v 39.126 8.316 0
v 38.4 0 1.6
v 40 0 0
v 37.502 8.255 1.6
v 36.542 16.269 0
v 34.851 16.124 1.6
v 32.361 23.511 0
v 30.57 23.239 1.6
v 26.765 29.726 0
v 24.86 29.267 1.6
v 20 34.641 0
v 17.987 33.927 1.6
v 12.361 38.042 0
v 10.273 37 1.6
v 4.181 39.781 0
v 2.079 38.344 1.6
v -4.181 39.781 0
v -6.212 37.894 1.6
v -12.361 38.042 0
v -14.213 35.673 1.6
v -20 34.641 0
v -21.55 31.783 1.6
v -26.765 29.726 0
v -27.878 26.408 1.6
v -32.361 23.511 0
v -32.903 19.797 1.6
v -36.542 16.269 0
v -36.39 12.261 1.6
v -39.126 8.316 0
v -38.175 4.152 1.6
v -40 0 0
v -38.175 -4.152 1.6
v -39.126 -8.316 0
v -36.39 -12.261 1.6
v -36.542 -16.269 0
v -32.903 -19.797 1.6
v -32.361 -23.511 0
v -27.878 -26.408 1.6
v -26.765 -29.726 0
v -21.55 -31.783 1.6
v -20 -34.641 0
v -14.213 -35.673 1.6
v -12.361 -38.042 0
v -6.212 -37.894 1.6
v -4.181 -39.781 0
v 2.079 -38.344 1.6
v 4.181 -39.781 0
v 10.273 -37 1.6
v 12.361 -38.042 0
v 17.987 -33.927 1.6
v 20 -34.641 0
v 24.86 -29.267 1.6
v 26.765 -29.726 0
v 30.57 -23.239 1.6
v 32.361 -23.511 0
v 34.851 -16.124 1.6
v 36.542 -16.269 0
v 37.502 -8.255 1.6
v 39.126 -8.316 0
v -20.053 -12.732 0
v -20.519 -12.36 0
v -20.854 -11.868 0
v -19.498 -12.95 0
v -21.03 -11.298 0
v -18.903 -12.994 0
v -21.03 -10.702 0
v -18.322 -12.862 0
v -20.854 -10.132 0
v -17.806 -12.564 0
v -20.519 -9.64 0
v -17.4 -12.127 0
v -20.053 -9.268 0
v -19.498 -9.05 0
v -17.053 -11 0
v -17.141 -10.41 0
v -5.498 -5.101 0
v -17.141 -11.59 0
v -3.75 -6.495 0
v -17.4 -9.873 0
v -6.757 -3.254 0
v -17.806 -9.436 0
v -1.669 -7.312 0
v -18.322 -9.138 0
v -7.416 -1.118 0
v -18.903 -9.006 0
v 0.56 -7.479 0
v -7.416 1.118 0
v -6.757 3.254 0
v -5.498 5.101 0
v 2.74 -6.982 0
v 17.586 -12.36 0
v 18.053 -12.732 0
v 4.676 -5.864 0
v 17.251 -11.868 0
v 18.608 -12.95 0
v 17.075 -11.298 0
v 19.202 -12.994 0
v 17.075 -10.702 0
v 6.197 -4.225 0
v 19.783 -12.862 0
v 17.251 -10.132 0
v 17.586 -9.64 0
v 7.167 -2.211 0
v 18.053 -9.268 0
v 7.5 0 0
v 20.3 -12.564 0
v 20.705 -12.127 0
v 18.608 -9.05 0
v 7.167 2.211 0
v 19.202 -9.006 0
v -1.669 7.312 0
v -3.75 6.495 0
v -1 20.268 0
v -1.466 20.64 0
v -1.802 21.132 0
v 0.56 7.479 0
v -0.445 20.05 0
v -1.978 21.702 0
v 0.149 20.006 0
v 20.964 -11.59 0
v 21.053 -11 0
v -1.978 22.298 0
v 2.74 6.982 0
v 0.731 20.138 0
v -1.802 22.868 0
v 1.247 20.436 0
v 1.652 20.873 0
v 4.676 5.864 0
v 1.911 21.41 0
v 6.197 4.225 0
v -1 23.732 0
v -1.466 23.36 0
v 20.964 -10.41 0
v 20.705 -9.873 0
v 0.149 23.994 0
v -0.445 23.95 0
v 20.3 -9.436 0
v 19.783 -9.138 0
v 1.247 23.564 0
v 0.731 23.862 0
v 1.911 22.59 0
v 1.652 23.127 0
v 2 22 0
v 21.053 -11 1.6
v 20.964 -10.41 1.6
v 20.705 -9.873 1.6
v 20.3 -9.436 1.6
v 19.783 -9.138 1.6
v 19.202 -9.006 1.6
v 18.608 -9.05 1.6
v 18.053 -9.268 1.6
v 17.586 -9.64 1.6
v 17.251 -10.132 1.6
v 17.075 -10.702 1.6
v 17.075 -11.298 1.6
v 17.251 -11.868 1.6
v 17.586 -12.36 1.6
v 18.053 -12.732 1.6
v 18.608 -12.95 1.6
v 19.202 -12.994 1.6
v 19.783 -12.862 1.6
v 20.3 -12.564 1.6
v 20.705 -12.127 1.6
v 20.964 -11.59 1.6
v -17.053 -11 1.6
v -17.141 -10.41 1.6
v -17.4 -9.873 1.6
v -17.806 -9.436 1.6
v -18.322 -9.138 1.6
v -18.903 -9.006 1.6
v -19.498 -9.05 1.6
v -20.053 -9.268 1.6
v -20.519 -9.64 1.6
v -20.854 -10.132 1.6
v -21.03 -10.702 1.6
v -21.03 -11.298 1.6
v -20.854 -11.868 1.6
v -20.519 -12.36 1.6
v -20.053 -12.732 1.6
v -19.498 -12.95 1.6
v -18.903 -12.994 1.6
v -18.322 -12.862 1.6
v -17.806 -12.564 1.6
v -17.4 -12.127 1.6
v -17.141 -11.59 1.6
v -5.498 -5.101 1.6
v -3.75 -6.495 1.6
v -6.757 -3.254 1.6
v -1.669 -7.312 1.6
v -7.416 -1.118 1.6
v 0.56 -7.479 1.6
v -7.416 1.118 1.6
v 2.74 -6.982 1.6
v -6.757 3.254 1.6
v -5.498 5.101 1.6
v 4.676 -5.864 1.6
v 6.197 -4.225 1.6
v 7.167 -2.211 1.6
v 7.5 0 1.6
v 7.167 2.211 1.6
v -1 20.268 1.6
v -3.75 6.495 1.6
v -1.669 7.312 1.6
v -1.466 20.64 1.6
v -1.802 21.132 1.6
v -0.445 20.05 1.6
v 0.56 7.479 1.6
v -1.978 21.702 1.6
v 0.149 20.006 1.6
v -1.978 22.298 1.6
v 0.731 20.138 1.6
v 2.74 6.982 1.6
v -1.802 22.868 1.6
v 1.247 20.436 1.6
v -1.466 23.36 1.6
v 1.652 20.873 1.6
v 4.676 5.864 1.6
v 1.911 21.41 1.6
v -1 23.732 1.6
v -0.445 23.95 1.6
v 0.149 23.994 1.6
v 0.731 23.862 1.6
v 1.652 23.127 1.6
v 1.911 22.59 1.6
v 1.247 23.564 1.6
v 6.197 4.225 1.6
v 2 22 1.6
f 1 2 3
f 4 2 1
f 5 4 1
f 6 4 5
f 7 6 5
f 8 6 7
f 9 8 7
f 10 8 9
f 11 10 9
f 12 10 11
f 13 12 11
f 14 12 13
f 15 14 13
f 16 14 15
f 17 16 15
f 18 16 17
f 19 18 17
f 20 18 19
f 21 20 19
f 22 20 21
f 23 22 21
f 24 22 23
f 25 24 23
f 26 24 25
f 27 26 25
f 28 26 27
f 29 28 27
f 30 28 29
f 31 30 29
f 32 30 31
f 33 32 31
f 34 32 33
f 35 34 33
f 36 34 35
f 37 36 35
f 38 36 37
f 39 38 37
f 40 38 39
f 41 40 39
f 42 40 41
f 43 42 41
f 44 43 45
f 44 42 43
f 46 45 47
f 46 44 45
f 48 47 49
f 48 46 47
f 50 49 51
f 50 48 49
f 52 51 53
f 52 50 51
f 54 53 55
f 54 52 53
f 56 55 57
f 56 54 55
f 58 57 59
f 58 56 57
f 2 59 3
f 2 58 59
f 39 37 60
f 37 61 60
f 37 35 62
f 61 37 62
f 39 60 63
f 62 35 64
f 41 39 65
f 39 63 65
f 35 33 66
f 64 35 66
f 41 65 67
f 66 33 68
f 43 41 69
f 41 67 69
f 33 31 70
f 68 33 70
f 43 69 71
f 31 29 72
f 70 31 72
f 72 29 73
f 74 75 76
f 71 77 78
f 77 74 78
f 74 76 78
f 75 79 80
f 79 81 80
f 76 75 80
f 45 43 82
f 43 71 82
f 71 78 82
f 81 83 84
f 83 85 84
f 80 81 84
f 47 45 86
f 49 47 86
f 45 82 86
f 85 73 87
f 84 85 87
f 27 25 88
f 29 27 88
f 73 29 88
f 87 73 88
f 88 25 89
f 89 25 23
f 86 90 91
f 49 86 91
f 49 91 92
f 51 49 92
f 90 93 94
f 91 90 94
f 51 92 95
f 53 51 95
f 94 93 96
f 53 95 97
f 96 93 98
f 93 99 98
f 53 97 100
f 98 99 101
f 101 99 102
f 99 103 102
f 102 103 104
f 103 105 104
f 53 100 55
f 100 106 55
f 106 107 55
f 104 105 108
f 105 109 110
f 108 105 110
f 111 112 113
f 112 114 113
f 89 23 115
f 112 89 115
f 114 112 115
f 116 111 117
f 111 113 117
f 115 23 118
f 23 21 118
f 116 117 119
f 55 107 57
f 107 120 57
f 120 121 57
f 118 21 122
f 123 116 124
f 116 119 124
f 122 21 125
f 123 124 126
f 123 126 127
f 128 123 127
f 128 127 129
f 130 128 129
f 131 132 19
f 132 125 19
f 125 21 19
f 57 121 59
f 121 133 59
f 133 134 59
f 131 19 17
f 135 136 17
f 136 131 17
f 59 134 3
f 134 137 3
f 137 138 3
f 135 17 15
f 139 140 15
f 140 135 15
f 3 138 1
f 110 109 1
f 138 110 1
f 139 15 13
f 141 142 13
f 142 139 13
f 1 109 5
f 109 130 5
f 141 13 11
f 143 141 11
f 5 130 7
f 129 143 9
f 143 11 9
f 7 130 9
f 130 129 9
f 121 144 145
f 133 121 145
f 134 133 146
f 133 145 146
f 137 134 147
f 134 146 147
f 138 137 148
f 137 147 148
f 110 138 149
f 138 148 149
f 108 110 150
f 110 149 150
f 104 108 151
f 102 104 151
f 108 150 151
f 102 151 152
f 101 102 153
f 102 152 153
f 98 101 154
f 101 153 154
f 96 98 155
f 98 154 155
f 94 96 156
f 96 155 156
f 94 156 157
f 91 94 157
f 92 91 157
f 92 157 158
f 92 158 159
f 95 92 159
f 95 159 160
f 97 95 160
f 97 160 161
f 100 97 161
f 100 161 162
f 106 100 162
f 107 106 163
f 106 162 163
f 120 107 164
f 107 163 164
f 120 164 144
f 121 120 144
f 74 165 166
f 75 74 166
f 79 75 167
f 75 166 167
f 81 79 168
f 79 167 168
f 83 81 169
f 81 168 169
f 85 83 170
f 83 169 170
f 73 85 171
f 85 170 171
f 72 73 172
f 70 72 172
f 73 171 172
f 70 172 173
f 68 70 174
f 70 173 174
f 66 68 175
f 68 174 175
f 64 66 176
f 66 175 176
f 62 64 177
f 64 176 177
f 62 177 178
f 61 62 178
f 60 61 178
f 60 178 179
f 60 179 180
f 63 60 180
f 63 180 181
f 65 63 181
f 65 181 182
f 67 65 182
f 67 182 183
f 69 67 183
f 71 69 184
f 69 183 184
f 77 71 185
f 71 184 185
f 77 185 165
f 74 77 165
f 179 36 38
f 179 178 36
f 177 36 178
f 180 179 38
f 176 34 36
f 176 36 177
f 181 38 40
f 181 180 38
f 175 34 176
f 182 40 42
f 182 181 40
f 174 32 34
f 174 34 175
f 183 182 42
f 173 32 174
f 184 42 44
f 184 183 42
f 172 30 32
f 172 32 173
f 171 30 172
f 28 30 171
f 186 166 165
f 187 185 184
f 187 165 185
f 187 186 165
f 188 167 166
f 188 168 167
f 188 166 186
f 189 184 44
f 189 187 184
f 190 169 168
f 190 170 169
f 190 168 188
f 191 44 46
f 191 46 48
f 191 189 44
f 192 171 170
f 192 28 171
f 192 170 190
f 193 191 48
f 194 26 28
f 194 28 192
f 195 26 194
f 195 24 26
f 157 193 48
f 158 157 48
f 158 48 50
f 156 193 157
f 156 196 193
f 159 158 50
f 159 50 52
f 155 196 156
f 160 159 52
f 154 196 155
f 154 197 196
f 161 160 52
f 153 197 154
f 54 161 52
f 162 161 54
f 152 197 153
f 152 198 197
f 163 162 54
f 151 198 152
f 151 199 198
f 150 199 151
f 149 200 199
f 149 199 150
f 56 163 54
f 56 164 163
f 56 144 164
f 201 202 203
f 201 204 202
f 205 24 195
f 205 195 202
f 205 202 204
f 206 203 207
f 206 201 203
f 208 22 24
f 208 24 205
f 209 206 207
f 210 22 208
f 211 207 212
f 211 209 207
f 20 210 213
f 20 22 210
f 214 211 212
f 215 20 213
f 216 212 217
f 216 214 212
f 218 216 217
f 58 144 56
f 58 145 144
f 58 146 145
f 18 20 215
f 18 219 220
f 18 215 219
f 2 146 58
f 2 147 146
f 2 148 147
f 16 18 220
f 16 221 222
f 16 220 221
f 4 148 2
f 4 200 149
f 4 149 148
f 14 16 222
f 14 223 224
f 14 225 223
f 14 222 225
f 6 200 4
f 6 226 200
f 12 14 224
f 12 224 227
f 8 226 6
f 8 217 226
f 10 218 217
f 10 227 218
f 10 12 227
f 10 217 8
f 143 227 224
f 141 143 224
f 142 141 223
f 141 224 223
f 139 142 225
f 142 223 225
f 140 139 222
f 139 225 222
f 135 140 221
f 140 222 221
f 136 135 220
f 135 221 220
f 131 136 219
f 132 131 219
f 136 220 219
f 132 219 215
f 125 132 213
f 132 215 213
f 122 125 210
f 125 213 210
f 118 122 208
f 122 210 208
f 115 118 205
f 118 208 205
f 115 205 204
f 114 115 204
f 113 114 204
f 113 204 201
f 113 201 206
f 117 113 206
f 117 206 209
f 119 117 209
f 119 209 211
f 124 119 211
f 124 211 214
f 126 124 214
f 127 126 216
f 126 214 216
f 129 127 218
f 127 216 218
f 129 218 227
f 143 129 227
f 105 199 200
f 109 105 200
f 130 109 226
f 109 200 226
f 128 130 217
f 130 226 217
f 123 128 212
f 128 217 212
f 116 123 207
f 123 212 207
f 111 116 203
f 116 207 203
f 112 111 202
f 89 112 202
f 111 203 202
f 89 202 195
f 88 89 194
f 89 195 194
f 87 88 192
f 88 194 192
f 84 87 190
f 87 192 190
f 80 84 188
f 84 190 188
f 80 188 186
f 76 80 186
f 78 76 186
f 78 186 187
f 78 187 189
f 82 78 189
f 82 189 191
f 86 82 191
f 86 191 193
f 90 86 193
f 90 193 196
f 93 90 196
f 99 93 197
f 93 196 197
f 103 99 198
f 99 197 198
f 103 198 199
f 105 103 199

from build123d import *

# Parameters (mm, degrees)
SKETCH1_R           = 40
BOSS_EXTRUDE1_DEPTH = 1.6
SKETCH2_R           = 7.5
SKETCH2_R_2         = 2
CUT_EXTRUDE1_DEPTH  = 1.6
CHAMFER1_SIZE       = 1.6


with BuildPart() as part:
    # Sketch1 → Boss-Extrude1 (new body)
    with BuildSketch(Plane.XY):
        Circle(SKETCH1_R)
    extrude(amount=BOSS_EXTRUDE1_DEPTH)

    # Sketch2 → Cut-Extrude1 (cut)
    with BuildSketch(Plane.XY.offset(1.6)):
        Circle(SKETCH2_R)
        with Locations((0, 22)):
            Circle(SKETCH2_R_2)
        with Locations((19.052558883, -11)):
            Circle(SKETCH2_R_2)
        with Locations((-19.052558883, -11)):
            Circle(SKETCH2_R_2)
    extrude(amount=-CUT_EXTRUDE1_DEPTH, mode=Mode.SUBTRACT)

    # Chamfer1
    chamfer1_edges = [part.edges().sort_by_distance(p)[0] for p in [
        (-40, 0, 1.6),
    ]]
    chamfer(chamfer1_edges, length=CHAMFER1_SIZE - 0.0001)  # a hair under: the kernel refuses the full size


solid = part.part
